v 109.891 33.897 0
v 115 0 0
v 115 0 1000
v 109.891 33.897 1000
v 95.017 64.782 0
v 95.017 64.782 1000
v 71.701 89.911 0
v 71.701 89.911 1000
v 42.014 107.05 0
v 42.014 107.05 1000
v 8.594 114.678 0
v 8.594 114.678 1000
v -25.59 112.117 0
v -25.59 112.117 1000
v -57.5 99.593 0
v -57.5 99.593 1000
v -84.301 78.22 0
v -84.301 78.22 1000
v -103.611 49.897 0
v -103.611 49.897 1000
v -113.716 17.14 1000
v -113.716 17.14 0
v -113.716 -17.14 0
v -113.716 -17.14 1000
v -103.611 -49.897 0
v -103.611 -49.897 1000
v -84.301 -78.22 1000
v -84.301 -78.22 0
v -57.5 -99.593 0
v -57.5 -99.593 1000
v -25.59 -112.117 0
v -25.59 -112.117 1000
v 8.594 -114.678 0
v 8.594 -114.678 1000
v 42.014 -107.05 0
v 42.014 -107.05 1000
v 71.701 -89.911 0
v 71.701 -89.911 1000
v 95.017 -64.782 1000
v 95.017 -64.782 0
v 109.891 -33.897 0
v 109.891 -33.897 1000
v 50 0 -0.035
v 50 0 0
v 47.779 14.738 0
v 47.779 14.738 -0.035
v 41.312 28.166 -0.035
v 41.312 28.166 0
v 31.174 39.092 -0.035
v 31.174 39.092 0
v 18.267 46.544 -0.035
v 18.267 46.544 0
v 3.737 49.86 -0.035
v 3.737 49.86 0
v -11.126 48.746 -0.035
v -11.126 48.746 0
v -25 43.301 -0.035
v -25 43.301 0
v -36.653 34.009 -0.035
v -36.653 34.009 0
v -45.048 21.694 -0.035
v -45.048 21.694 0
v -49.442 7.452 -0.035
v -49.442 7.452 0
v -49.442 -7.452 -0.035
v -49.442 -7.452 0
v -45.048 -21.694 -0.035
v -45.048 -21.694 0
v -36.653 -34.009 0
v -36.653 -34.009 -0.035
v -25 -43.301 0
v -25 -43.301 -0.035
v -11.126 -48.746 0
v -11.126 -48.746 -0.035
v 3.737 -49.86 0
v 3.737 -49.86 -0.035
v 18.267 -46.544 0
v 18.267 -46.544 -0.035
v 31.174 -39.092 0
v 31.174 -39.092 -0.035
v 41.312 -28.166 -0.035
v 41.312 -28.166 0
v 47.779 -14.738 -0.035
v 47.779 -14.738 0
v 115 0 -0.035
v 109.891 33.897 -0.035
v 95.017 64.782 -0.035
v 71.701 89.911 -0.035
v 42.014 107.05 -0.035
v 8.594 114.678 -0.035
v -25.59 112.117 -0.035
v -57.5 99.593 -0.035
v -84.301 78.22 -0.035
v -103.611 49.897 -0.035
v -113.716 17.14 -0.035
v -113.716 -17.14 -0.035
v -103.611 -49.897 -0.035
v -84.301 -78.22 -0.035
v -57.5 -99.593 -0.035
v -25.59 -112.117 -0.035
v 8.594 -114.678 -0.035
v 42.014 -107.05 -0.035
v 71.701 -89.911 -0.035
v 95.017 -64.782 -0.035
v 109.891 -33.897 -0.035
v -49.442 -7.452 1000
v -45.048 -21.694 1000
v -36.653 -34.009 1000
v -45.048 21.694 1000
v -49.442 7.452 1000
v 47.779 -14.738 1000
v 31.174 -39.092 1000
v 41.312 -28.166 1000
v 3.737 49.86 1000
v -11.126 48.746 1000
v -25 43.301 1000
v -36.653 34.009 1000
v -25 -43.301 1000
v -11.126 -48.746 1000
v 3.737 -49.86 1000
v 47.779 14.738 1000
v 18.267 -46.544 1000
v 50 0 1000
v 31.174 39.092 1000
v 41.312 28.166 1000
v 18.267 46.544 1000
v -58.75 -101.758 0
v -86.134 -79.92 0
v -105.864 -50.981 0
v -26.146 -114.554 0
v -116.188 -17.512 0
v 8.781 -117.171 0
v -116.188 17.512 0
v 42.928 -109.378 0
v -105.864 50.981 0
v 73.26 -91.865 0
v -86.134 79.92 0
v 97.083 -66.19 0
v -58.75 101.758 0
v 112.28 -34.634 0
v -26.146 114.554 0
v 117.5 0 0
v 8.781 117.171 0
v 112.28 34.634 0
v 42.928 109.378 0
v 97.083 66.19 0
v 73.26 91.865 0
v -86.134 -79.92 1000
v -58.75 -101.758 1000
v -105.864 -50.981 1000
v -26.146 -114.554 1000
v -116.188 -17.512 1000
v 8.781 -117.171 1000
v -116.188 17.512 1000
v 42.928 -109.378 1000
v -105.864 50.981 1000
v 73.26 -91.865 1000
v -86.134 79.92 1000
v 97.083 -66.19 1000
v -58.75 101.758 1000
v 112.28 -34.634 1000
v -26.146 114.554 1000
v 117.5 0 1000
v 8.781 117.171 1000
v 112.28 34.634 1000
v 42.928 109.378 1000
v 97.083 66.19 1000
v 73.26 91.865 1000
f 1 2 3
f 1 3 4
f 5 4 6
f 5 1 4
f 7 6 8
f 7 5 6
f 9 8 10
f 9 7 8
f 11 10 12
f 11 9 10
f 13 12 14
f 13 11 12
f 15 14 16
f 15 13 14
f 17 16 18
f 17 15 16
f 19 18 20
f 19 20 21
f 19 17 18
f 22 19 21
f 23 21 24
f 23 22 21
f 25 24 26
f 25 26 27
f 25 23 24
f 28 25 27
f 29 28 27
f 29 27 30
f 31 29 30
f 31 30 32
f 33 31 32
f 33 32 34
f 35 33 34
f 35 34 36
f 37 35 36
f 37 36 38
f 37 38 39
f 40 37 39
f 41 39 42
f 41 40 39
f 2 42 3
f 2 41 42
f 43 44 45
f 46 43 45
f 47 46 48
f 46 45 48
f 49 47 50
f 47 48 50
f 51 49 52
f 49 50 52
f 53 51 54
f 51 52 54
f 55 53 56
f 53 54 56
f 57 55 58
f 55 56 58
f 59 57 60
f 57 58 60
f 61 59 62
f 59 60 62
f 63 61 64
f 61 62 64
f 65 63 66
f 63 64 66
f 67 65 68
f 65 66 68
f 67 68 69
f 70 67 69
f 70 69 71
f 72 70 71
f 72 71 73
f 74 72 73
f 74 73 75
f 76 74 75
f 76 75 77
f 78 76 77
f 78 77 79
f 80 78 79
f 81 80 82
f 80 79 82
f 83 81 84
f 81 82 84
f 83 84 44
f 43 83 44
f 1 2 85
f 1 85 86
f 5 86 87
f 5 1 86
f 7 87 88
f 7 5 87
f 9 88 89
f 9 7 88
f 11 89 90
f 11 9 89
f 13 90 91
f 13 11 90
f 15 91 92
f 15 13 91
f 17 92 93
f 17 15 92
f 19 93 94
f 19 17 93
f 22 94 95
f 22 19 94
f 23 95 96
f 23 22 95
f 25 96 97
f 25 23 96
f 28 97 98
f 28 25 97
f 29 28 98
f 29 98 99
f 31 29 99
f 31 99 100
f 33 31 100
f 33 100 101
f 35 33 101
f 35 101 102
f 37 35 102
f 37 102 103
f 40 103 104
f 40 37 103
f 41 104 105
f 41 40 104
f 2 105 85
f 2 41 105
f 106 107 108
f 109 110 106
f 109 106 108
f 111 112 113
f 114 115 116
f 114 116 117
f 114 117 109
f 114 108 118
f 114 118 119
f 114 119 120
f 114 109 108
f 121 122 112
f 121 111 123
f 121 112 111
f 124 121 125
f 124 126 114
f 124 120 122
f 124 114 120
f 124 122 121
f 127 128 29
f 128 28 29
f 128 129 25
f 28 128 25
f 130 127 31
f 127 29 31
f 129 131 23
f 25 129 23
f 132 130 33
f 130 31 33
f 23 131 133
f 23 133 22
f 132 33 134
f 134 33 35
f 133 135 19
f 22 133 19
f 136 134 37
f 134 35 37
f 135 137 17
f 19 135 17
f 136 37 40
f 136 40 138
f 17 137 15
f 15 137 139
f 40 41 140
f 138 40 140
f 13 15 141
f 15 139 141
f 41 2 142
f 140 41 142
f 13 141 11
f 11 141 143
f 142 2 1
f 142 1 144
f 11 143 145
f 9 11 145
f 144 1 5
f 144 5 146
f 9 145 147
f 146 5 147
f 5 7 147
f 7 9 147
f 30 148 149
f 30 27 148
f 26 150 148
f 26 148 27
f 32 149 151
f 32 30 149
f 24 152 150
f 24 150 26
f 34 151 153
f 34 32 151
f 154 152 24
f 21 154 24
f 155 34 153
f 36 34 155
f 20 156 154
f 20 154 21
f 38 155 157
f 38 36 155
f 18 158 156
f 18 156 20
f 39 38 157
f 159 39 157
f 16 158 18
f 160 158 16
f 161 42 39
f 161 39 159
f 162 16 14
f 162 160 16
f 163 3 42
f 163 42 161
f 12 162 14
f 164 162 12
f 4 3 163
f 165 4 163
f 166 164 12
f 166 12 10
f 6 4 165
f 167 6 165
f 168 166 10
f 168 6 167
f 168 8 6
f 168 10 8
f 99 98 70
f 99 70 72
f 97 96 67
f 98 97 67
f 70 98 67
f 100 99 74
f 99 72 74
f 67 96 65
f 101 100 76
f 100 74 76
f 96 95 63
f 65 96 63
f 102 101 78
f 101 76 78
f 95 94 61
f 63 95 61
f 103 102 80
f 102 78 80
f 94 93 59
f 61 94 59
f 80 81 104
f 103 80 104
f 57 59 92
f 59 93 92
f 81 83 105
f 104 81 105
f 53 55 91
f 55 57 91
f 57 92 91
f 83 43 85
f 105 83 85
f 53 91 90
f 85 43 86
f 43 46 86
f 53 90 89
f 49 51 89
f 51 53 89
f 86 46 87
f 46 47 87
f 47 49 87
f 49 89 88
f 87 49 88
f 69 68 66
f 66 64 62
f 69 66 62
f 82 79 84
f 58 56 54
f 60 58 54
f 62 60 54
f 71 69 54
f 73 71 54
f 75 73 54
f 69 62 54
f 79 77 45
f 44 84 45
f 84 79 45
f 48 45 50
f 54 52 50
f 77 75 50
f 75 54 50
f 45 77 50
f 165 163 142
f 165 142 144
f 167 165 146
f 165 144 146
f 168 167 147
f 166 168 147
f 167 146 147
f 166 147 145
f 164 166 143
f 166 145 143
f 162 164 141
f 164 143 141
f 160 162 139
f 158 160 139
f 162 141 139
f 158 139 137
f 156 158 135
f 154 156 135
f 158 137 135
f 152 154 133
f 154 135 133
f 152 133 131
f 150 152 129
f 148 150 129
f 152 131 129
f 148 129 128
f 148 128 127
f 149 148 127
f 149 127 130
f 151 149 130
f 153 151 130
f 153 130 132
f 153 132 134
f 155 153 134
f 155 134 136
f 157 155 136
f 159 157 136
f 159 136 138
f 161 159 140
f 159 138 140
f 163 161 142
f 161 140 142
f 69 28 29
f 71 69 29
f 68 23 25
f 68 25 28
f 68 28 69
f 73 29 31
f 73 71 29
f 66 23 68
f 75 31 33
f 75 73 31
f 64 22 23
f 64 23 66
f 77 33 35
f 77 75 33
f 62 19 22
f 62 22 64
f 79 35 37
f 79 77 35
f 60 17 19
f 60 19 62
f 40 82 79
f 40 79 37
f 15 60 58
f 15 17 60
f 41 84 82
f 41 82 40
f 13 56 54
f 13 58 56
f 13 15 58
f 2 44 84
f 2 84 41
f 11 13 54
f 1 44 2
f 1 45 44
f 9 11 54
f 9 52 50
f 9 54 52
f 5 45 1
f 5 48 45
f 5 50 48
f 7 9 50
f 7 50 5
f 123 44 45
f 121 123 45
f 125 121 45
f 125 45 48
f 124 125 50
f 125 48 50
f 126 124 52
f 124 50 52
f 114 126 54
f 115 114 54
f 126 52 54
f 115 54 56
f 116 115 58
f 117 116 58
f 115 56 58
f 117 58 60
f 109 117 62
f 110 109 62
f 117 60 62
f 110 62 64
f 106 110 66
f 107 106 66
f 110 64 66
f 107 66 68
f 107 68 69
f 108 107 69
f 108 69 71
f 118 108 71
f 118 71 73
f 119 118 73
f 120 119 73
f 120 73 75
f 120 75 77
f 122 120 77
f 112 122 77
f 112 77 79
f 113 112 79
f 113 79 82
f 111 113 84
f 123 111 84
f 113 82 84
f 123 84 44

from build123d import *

# Parameters (mm, degrees)
SKETCH_R         = 117.5
SKETCH_R_2       = 115
EXTRUDE_DEPTH    = 1000
SKETCH001_R      = 50
EXTRUDE001_DEPTH = 1000
SKETCH002_R      = 115
SKETCH002_R_2    = 50
EXTRUDE002_DEPTH = 0.035


with BuildPart() as gnd:
    # Sketch → Extrude (new body)
    with BuildSketch(Plane.XY):
        Circle(SKETCH_R)
        Circle(SKETCH_R_2, mode=Mode.SUBTRACT)
    extrude(amount=EXTRUDE_DEPTH)


with BuildPart() as antenna:
    # Sketch001 → Extrude001 (new body)
    with BuildSketch(Plane.XY):
        Circle(SKETCH001_R)
    extrude(amount=EXTRUDE001_DEPTH)


with BuildPart() as excitationcoax:
    # Sketch002 → Extrude002 (new body)
    with BuildSketch(Plane.XY):
        Circle(SKETCH002_R)
        Circle(SKETCH002_R_2, mode=Mode.SUBTRACT)
    extrude(amount=-EXTRUDE002_DEPTH)


solid = Compound([gnd.part, antenna.part, excitationcoax.part])
